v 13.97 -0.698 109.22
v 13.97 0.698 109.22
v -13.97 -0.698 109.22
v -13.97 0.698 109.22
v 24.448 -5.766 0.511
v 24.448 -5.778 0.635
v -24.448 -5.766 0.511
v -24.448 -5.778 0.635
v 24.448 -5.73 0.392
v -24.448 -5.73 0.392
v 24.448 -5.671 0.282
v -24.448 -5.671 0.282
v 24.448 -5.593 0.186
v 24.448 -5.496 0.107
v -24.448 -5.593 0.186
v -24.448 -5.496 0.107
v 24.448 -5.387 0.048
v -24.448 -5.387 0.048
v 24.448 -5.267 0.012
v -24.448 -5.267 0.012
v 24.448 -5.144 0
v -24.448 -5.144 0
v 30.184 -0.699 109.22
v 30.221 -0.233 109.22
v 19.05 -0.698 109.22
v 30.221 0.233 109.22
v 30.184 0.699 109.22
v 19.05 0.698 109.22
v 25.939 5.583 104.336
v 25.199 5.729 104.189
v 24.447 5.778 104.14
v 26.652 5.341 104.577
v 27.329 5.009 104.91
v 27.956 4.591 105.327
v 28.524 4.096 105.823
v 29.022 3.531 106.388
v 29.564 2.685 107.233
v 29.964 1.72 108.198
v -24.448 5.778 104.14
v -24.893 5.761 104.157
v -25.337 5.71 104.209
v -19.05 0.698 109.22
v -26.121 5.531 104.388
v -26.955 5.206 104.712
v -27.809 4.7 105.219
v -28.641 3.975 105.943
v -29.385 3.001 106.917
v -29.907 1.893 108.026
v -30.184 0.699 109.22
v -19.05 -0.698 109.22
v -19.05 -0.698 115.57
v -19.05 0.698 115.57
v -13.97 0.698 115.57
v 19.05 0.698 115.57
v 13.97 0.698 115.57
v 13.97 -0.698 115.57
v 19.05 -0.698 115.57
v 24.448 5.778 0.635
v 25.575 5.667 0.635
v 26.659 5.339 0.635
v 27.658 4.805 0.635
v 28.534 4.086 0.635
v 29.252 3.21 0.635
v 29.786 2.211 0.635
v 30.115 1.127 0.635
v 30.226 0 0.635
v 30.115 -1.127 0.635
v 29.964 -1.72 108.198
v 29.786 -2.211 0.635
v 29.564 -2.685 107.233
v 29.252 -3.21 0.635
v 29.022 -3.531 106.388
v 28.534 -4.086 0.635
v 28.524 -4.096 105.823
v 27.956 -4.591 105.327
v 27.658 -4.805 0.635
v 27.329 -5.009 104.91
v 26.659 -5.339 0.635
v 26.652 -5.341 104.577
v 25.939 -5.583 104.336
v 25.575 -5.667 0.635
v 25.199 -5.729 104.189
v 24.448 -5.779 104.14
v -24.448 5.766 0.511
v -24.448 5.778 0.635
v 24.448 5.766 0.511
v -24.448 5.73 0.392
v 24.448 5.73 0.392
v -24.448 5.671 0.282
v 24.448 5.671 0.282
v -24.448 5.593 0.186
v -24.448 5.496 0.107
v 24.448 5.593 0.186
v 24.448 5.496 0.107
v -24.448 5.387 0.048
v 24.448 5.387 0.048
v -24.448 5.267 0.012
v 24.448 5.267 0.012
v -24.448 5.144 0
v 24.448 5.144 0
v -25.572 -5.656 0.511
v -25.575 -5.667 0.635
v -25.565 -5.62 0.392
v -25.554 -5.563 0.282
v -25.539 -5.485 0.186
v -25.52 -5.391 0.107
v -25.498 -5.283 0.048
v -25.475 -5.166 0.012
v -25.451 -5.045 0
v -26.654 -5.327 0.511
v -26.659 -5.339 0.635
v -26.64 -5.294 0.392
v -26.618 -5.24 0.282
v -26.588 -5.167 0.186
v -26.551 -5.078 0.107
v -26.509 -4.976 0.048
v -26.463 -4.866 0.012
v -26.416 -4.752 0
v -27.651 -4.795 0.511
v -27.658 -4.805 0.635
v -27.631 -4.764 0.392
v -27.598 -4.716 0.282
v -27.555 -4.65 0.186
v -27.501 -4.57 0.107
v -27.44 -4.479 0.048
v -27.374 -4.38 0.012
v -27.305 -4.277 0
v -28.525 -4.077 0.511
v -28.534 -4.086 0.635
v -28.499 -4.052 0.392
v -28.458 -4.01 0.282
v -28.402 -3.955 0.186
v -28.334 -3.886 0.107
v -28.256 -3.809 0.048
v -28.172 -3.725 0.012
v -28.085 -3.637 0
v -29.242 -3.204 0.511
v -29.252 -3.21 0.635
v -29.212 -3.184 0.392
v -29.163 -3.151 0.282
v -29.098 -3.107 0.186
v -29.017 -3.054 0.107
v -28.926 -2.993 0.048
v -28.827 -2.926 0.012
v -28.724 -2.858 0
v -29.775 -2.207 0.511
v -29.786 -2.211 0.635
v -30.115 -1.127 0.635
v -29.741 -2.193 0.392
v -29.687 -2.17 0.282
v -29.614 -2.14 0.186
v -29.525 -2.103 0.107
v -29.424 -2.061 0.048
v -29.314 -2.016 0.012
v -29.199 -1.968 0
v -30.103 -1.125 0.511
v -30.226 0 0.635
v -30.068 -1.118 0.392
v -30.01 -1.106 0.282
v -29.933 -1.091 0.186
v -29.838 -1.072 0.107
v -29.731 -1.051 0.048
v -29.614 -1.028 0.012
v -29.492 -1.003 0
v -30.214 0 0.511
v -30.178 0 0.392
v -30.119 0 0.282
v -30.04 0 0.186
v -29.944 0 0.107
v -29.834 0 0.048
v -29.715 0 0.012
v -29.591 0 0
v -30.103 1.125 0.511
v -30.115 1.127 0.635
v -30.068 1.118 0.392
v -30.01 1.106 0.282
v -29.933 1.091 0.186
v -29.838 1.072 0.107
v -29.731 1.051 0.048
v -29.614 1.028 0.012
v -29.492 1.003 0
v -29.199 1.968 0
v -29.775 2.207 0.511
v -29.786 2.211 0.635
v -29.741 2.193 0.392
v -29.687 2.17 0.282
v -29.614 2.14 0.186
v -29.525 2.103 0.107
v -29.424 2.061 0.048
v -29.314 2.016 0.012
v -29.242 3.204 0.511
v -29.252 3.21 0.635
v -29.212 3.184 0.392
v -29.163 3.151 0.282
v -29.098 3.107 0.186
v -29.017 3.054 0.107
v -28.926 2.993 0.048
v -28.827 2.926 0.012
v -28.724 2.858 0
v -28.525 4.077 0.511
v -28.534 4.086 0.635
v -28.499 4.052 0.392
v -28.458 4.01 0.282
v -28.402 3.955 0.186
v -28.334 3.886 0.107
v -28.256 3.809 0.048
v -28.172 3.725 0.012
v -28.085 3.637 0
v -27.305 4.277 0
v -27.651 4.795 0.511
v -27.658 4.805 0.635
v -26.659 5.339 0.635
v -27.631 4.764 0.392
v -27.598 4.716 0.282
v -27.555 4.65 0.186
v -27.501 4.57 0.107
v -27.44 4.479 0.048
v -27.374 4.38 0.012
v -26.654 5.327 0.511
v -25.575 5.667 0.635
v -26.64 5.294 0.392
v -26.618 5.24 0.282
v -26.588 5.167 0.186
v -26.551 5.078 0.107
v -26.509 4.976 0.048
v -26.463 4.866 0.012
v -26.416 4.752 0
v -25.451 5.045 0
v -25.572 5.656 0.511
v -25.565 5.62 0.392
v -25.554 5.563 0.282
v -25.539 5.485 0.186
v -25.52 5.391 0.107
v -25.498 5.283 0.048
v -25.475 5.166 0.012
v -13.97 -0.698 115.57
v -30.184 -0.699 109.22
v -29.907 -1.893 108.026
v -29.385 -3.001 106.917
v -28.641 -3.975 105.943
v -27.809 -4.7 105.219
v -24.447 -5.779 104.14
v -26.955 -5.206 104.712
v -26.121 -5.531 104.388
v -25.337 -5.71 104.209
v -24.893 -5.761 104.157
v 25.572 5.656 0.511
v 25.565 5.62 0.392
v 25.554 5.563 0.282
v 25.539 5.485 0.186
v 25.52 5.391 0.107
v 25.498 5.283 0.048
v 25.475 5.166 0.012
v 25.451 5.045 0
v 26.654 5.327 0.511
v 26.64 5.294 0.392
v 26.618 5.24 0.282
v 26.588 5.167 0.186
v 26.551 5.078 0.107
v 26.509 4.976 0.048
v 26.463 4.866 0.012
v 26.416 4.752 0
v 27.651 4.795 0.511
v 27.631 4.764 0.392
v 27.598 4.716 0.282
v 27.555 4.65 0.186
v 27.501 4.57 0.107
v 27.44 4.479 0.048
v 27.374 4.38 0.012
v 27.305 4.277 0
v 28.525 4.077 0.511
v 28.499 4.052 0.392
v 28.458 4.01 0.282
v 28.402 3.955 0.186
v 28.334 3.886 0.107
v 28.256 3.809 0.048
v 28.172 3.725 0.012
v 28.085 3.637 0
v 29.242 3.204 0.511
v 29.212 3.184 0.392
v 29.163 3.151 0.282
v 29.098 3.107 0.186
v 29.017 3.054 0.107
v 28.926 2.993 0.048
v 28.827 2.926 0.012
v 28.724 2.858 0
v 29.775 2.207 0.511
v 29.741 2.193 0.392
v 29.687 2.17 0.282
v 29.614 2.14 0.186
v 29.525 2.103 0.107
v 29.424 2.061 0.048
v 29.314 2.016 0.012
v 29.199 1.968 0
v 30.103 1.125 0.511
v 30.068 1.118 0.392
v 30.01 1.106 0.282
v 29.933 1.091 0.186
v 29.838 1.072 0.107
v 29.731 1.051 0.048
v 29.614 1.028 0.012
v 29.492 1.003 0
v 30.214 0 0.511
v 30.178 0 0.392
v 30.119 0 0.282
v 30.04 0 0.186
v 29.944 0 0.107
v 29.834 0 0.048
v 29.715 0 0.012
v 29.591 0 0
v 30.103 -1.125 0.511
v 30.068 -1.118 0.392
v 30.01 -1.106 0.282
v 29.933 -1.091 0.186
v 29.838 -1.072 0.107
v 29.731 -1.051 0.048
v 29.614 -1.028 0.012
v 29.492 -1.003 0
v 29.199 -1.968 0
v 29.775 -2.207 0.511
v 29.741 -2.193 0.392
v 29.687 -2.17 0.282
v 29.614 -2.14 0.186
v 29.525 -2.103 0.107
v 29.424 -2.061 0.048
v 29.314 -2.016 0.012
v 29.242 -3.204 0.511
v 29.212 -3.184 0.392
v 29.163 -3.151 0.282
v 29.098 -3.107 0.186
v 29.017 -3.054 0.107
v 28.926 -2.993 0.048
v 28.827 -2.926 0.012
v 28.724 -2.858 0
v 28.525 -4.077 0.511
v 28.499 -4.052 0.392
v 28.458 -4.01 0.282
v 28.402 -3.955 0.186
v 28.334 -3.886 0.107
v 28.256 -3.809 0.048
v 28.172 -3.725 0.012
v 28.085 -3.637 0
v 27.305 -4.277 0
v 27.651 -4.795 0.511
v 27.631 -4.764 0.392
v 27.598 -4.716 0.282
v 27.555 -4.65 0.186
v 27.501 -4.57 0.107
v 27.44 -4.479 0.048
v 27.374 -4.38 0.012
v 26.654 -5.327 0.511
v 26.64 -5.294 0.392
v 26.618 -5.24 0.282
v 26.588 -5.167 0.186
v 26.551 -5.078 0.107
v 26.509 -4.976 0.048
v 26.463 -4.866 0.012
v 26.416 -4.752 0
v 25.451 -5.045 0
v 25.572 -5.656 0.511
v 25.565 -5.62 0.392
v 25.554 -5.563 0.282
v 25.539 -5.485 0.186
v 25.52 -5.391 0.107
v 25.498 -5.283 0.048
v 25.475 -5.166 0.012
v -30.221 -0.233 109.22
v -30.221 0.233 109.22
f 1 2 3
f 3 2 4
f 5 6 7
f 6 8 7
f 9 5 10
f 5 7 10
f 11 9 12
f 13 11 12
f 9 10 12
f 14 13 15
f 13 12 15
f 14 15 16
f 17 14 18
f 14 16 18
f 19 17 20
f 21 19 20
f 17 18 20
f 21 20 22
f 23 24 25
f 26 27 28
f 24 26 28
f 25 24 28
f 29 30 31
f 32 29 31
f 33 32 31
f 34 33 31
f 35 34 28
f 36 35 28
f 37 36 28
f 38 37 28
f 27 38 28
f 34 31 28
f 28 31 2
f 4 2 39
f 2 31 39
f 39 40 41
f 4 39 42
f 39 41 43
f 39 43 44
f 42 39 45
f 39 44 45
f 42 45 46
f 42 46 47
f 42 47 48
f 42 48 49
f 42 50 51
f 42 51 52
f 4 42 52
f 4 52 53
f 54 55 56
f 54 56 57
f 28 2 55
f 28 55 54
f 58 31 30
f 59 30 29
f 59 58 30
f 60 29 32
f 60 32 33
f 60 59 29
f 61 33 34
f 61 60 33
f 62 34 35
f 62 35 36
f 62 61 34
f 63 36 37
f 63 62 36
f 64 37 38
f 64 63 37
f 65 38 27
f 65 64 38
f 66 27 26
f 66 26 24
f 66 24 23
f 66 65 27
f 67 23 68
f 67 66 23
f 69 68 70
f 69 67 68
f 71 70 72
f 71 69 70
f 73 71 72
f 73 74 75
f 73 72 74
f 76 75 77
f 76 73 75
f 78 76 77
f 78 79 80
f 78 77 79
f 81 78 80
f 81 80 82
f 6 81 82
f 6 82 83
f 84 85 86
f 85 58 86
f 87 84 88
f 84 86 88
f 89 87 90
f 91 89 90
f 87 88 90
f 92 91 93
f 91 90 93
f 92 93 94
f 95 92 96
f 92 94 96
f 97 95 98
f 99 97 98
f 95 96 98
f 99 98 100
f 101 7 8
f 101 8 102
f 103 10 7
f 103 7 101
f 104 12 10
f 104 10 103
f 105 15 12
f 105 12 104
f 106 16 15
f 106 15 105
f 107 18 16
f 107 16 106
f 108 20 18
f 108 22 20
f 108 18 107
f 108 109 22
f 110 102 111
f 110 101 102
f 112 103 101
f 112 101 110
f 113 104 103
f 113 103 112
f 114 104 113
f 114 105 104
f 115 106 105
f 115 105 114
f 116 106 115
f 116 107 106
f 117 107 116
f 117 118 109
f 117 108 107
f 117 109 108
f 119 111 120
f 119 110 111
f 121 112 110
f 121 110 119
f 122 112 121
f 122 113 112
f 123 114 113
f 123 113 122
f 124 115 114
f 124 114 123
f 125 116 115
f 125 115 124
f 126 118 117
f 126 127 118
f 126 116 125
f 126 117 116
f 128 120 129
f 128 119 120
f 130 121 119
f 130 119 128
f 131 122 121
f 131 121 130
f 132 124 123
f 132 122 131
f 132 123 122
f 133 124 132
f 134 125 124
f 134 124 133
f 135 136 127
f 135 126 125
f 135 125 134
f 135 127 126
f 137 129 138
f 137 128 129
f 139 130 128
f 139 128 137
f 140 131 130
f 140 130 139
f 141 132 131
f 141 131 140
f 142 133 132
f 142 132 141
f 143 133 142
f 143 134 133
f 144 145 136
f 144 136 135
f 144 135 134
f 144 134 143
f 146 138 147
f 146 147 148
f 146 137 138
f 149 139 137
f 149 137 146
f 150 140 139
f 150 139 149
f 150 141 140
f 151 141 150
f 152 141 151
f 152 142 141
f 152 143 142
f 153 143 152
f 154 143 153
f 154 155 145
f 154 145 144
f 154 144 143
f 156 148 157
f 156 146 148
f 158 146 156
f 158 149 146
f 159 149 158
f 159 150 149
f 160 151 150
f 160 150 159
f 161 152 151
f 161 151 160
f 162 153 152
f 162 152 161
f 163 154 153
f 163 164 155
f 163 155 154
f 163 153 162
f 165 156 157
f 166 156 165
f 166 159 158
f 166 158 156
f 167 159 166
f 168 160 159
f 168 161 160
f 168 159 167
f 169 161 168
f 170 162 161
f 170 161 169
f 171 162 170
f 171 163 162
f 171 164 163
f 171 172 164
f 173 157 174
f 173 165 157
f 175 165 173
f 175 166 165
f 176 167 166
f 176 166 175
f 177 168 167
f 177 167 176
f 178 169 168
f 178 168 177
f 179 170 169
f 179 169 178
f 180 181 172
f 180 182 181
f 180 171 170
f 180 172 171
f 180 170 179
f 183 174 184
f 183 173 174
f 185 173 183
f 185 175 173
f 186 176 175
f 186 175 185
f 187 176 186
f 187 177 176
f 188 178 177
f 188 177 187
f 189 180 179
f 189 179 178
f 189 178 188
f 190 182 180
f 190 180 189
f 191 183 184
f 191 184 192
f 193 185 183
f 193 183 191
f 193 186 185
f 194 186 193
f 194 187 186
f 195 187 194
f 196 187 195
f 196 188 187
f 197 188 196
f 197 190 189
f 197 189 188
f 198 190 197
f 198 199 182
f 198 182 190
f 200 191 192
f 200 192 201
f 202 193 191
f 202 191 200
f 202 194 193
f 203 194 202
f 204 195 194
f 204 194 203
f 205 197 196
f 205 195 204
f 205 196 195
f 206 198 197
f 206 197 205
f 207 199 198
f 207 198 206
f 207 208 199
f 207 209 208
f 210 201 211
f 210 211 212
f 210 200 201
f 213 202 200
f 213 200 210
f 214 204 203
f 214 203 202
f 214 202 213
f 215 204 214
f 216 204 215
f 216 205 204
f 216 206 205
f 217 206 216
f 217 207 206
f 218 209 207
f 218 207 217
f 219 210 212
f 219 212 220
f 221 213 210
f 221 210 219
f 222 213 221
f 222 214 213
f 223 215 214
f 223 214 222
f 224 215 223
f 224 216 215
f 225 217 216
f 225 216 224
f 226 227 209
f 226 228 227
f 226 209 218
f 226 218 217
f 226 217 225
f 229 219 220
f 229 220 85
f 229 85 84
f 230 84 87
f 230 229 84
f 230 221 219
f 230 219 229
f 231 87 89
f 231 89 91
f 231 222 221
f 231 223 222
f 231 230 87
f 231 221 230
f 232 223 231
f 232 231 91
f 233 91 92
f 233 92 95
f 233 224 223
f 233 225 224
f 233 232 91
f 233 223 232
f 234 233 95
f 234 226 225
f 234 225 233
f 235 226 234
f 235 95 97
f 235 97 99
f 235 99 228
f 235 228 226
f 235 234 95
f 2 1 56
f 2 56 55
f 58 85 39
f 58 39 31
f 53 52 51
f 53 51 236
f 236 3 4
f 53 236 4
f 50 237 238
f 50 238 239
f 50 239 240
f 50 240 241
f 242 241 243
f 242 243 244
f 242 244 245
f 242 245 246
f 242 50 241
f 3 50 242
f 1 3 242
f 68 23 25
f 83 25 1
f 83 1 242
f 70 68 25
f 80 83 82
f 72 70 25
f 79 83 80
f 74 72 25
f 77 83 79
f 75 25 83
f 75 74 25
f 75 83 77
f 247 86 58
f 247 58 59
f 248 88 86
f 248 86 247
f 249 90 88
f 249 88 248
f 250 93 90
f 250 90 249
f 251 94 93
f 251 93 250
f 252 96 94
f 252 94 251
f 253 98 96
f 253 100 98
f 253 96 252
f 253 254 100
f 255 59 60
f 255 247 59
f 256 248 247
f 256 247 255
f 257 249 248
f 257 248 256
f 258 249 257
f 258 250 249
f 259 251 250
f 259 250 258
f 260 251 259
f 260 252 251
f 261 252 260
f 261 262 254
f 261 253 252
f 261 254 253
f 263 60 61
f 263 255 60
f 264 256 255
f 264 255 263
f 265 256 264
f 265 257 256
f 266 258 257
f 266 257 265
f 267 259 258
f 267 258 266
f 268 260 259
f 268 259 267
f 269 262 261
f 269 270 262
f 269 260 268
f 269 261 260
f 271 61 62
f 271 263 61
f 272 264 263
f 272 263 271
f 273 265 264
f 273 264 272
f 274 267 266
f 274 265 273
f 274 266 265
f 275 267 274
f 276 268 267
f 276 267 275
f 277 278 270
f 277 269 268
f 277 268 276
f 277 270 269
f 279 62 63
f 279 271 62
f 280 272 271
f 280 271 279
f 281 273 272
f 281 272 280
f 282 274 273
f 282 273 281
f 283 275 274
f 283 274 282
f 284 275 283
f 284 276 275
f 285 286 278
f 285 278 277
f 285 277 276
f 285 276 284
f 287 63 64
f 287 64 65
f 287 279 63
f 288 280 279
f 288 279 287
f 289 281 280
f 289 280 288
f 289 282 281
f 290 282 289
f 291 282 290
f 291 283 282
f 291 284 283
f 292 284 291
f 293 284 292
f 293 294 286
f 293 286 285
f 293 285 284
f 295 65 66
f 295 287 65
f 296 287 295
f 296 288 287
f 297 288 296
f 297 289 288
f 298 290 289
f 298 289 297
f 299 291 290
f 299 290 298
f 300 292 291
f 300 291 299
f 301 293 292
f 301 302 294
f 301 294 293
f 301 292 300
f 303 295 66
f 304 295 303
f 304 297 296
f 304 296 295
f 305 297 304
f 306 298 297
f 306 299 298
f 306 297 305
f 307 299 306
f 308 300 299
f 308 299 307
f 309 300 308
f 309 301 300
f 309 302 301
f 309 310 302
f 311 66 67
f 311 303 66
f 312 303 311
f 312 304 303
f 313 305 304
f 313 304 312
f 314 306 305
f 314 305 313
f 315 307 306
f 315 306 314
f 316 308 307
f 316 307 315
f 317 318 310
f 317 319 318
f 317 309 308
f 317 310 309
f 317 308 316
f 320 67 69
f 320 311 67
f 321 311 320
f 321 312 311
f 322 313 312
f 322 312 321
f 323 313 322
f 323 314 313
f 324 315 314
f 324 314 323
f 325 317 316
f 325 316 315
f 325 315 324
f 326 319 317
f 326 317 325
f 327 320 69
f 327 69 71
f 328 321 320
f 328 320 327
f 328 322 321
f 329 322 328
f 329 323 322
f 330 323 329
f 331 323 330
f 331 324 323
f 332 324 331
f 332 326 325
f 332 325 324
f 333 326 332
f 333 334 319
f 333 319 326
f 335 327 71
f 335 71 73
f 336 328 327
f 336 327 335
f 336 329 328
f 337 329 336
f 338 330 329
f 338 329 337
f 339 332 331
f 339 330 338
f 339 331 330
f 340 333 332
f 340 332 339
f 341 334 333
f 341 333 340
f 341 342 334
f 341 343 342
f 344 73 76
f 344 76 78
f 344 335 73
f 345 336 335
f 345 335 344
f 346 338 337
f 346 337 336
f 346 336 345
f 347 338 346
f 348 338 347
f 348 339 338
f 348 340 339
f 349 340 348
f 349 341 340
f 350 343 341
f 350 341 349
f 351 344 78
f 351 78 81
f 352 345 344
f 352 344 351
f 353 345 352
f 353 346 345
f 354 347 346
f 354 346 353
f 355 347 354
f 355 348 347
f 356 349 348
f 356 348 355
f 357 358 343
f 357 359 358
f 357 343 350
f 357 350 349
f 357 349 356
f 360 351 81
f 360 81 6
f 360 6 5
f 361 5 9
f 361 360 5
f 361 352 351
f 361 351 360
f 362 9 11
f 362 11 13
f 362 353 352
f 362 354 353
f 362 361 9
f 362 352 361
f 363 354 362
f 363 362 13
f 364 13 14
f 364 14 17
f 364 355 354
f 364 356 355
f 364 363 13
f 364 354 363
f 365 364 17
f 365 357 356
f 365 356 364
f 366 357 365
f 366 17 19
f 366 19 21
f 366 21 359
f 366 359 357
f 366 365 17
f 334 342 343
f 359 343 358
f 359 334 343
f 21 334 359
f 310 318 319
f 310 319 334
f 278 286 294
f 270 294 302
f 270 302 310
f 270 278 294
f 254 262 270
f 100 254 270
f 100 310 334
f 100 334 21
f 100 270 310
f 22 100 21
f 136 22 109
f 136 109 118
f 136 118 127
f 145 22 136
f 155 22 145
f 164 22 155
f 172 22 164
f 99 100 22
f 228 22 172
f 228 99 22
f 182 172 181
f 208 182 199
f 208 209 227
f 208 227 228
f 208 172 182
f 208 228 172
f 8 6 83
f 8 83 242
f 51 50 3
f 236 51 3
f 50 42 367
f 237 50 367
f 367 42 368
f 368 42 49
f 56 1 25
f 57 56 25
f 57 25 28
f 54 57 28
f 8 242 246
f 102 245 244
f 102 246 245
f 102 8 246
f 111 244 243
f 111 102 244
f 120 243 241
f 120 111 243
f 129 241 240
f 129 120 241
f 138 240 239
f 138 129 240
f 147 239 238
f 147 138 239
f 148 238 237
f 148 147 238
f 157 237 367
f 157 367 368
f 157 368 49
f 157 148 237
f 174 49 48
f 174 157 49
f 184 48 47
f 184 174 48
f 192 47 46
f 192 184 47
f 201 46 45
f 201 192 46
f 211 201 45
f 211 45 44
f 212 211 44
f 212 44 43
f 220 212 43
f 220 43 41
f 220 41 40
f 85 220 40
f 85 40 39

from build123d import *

# Parameters (mm, degrees)
BOSS_EXTRUDE1_DEPTH = 109.22
FILLET1_R           = 0.635
CHAMFER1_SIZE       = 5.08
SKETCH2_W           = 5.08
SKETCH2_H           = 1.397
BOSS_EXTRUDE2_DEPTH = 6.35


with BuildPart() as part:
    # Sketch1 → Boss-Extrude1 (new body)
    with BuildSketch(Plane.XY):
        with BuildLine():
            Line((24.4475, -5.7785), (-24.4475, -5.7785))
            ThreePointArc((-24.4475, -5.7785), (-30.226, 0), (-24.4475, 5.7785))
            Line((-24.4475, 5.7785), (24.4475, 5.7785))
            ThreePointArc((24.4475, 5.7785), (30.226, 0), (24.4475, -5.7785))
        make_face()
    extrude(amount=BOSS_EXTRUDE1_DEPTH)

    # Fillet1
    fillet1_edges = [part.edges().sort_by_distance(p)[0] for p in [
        (0, 5.7785, 0),
        (30.226, 0, 0),
        (0, -5.7785, 0),
        (-30.226, 0, 0),
    ]]
    fillet(fillet1_edges, radius=FILLET1_R)

    # Chamfer1
    # the kernel refuses this chamfer: 5.08 mm, written as the material it takes off along each edge
    with BuildSketch(Plane(origin=(-37.511649579, 5.7785, 109.22), x_dir=(0, 0.02749587661058642, -0.9996219169112968), z_dir=(1, 0, 0))) as chamfer1_piece_1:
        Polygon((CHAMFER1_SIZE * 0.999621916911, -CHAMFER1_SIZE * 0.0274958766106), (-CHAMFER1_SIZE * 0.0274958766106, -CHAMFER1_SIZE * 0.999621916911), (0, 0), align=None)
    extrude(amount=75.023299158, mode=Mode.SUBTRACT)
    with BuildSketch(Plane(origin=(37.511649579, -5.7785, 109.22), x_dir=(0, 0.9996219169112966, 0.02749587661058728), z_dir=(-1, 0, 0))) as chamfer1_piece_2:
        Polygon((CHAMFER1_SIZE * 0.999621916911, CHAMFER1_SIZE * 0.0274958766106), (-CHAMFER1_SIZE * 0.0274958766106, CHAMFER1_SIZE * 0.999621916911), (0, 0), align=None)
    extrude(amount=75.023299158, mode=Mode.SUBTRACT)

    # Sketch2 → Boss-Extrude2 (add)
    with BuildSketch(Plane.XY.offset(109.22)):
        with Locations((-16.51, 0)):
            Rectangle(SKETCH2_W, SKETCH2_H)
        with Locations((16.51, 0)):
            Rectangle(SKETCH2_W, SKETCH2_H)
    extrude(amount=BOSS_EXTRUDE2_DEPTH)


solid = part.part
